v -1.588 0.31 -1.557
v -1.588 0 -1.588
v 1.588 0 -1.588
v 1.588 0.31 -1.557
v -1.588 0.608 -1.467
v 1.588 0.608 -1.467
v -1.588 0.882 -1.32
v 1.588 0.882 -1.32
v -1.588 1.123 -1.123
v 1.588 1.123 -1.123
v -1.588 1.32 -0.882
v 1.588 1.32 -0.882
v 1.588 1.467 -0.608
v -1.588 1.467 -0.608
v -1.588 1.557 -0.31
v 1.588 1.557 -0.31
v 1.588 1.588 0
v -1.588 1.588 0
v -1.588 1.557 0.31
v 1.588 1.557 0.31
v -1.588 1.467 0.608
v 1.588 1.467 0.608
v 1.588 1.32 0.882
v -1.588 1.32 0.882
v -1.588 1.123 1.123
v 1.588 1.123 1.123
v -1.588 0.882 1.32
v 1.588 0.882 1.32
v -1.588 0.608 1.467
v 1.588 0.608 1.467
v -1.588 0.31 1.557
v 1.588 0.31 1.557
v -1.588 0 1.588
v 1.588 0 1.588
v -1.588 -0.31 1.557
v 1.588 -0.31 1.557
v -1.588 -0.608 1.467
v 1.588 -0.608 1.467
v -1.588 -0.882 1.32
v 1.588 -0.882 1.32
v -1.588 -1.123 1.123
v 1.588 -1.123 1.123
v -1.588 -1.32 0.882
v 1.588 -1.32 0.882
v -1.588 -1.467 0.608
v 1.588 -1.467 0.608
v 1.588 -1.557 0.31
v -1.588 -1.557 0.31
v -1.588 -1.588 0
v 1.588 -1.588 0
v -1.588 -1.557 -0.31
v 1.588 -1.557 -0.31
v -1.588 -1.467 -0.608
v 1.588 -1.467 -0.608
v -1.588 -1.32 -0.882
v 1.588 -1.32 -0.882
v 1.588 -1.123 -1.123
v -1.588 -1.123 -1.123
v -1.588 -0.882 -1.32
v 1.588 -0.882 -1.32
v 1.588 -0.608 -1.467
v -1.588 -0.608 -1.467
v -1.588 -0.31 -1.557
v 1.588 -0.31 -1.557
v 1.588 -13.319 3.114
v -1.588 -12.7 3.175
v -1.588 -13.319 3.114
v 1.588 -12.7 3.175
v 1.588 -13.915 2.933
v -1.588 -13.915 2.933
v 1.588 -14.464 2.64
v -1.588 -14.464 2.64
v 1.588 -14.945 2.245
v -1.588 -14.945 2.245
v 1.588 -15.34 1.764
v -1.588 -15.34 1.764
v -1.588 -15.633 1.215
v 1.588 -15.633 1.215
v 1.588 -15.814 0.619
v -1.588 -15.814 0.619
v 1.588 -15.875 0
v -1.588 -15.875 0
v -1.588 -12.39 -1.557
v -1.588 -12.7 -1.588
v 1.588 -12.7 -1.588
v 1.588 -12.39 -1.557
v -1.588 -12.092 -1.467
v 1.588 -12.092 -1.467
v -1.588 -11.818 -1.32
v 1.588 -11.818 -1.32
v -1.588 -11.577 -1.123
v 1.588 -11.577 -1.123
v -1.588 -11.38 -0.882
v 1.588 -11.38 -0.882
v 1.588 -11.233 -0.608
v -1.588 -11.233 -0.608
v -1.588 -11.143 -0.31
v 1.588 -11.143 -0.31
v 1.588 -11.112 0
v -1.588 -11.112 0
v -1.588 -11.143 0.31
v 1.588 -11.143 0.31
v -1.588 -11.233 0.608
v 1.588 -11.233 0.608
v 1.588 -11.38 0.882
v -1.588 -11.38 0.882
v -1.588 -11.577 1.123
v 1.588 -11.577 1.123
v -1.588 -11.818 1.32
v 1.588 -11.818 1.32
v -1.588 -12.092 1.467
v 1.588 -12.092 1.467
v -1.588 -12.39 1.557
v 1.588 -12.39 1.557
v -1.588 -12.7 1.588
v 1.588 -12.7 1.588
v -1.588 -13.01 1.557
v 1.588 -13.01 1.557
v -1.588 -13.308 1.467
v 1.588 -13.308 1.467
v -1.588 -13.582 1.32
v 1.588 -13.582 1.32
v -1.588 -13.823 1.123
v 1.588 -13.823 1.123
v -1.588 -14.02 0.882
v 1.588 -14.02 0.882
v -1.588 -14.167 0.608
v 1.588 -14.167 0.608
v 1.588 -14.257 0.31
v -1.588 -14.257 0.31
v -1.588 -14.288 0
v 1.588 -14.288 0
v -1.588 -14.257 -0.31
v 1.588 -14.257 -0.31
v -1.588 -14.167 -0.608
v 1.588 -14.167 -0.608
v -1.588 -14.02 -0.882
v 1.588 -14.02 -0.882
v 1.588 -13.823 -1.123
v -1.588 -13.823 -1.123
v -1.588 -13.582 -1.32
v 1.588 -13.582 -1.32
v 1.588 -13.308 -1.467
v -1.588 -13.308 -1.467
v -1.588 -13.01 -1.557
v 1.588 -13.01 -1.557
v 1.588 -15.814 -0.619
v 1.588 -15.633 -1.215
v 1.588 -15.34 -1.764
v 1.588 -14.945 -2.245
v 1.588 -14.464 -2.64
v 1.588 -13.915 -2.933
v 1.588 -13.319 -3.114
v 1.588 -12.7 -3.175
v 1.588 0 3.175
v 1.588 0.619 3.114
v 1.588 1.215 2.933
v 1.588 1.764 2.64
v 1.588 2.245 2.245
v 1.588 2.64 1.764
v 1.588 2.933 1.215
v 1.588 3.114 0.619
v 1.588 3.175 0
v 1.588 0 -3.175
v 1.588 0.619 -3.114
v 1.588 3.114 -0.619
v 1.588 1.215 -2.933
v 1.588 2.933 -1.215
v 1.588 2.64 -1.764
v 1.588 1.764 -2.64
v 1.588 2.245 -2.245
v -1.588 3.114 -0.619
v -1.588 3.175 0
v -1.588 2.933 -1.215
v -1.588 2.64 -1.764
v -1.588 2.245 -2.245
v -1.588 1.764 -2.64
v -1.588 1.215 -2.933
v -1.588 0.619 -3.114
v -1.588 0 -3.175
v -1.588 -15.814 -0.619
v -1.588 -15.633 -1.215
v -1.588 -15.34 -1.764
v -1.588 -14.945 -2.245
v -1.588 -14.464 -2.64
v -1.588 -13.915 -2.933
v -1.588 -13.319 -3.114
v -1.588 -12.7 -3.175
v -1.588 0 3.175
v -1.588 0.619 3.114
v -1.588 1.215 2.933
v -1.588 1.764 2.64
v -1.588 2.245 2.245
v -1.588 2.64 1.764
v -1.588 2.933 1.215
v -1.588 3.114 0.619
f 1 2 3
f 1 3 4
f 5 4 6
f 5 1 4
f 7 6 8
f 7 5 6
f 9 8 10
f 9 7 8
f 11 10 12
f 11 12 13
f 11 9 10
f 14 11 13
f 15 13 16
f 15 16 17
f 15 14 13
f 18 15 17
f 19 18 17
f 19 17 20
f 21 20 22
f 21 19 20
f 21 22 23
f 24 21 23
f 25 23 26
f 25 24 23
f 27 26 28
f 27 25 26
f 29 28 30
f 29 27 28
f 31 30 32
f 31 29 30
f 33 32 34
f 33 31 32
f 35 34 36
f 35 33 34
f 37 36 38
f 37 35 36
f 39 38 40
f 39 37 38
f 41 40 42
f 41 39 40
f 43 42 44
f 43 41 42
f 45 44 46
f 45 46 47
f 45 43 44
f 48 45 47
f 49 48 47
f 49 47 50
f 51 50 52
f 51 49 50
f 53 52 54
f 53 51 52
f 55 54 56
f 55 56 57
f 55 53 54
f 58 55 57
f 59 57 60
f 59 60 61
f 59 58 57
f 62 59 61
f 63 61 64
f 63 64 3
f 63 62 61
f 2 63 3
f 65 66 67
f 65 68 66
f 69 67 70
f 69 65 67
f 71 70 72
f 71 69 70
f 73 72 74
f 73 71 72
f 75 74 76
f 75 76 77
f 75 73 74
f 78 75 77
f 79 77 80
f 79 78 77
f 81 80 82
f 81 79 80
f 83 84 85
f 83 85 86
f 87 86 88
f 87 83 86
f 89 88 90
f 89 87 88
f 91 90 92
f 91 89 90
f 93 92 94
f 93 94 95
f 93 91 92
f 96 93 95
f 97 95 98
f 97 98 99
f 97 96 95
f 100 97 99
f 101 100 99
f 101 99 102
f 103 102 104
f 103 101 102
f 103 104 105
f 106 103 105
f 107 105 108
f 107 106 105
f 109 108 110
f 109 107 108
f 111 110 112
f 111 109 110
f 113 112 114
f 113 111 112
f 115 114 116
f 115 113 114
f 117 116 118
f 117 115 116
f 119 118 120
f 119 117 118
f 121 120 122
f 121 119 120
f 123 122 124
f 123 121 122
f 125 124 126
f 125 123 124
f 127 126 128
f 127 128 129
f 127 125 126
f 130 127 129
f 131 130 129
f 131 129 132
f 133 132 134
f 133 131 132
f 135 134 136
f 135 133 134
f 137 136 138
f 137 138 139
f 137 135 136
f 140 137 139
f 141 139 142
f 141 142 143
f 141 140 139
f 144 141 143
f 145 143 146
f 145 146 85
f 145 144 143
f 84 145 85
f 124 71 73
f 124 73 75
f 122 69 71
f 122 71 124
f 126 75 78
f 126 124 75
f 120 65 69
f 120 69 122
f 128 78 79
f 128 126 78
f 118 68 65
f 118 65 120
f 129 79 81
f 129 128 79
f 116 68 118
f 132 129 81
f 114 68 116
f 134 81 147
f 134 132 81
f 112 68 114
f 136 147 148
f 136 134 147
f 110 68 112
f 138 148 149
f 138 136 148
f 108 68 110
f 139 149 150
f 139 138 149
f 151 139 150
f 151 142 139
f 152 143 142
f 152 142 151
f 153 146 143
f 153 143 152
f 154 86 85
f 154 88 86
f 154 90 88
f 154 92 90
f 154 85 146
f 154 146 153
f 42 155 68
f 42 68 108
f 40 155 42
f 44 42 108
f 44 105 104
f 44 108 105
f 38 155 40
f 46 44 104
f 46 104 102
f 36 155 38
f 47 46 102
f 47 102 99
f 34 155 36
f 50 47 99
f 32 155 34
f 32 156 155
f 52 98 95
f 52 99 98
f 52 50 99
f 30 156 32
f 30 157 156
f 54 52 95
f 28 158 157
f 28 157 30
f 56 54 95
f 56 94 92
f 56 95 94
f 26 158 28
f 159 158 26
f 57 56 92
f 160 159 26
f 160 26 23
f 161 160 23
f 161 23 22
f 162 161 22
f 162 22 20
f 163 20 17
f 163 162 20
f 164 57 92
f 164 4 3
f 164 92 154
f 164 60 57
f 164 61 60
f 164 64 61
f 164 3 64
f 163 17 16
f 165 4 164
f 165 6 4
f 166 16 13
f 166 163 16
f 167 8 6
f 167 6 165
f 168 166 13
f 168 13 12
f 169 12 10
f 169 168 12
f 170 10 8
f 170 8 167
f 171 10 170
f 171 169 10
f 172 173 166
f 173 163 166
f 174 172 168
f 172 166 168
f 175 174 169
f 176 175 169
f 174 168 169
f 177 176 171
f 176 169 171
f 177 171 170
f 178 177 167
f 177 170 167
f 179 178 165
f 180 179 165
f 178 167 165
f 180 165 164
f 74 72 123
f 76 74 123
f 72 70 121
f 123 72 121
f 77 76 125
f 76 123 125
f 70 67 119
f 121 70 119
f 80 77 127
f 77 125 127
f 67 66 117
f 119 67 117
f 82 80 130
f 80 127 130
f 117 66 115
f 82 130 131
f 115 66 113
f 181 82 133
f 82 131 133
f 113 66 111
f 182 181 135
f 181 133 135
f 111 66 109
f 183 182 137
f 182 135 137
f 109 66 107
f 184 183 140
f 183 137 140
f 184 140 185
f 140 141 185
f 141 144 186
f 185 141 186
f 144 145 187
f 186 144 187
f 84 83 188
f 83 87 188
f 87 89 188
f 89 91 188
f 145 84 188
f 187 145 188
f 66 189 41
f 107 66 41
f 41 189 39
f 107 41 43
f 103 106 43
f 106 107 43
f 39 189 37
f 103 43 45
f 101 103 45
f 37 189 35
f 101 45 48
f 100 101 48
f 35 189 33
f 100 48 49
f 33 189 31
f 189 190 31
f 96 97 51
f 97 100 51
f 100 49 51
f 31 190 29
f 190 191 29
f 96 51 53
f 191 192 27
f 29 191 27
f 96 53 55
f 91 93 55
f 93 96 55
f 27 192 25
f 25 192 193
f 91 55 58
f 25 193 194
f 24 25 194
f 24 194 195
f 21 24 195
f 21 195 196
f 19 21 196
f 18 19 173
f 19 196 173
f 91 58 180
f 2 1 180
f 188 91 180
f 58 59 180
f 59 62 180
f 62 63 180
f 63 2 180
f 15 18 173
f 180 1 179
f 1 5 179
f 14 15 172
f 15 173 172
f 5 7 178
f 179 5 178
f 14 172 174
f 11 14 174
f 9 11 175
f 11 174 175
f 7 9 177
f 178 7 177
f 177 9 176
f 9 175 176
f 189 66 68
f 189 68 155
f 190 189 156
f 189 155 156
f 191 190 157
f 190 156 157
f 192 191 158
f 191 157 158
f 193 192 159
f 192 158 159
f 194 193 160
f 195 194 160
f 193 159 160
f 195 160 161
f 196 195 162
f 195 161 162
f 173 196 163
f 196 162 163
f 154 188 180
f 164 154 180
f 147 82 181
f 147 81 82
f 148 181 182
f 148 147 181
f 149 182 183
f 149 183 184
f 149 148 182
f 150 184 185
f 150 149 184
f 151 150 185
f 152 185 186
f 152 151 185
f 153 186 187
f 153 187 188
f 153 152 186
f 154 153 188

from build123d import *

# Parameters (mm, degrees)
BOSS_EXTRUDE1_DEPTH      = 1.5875
BOSS_EXTRUDE1_DEPTH_BACK = 1.5875
SKETCH1_W                = 6.35
SKETCH1_H                = 19.05
SKETCH1_R                = 1.5875
FILLET1_R                = 3.175


with BuildPart() as part:
    # Sketch1 → Boss-Extrude1 (new, two sides: drawn at the far end of the back side and taken through both)
    with BuildSketch(Plane(origin=(0, 0, 0), x_dir=(0, 0, -1), z_dir=(1, 0, 0)).offset(-BOSS_EXTRUDE1_DEPTH_BACK)):
        with Locations((0, -6.35)):
            Rectangle(SKETCH1_W, SKETCH1_H)
        Circle(SKETCH1_R, mode=Mode.SUBTRACT)
        with Locations((0, -12.7)):
            Circle(SKETCH1_R, mode=Mode.SUBTRACT)
    extrude(amount=BOSS_EXTRUDE1_DEPTH + BOSS_EXTRUDE1_DEPTH_BACK)

    # Fillet1
    fillet1_edges = [part.edges().sort_by_distance(p)[0] for p in [
        (0, -15.875, -3.175),
        (0, -15.875, 3.175),
        (0, 3.175, -3.175),
        (0, 3.175, 3.175),
    ]]
    fillet(fillet1_edges, radius=FILLET1_R - 0.0001)  # a hair under: the kernel refuses the full size


solid = part.part
